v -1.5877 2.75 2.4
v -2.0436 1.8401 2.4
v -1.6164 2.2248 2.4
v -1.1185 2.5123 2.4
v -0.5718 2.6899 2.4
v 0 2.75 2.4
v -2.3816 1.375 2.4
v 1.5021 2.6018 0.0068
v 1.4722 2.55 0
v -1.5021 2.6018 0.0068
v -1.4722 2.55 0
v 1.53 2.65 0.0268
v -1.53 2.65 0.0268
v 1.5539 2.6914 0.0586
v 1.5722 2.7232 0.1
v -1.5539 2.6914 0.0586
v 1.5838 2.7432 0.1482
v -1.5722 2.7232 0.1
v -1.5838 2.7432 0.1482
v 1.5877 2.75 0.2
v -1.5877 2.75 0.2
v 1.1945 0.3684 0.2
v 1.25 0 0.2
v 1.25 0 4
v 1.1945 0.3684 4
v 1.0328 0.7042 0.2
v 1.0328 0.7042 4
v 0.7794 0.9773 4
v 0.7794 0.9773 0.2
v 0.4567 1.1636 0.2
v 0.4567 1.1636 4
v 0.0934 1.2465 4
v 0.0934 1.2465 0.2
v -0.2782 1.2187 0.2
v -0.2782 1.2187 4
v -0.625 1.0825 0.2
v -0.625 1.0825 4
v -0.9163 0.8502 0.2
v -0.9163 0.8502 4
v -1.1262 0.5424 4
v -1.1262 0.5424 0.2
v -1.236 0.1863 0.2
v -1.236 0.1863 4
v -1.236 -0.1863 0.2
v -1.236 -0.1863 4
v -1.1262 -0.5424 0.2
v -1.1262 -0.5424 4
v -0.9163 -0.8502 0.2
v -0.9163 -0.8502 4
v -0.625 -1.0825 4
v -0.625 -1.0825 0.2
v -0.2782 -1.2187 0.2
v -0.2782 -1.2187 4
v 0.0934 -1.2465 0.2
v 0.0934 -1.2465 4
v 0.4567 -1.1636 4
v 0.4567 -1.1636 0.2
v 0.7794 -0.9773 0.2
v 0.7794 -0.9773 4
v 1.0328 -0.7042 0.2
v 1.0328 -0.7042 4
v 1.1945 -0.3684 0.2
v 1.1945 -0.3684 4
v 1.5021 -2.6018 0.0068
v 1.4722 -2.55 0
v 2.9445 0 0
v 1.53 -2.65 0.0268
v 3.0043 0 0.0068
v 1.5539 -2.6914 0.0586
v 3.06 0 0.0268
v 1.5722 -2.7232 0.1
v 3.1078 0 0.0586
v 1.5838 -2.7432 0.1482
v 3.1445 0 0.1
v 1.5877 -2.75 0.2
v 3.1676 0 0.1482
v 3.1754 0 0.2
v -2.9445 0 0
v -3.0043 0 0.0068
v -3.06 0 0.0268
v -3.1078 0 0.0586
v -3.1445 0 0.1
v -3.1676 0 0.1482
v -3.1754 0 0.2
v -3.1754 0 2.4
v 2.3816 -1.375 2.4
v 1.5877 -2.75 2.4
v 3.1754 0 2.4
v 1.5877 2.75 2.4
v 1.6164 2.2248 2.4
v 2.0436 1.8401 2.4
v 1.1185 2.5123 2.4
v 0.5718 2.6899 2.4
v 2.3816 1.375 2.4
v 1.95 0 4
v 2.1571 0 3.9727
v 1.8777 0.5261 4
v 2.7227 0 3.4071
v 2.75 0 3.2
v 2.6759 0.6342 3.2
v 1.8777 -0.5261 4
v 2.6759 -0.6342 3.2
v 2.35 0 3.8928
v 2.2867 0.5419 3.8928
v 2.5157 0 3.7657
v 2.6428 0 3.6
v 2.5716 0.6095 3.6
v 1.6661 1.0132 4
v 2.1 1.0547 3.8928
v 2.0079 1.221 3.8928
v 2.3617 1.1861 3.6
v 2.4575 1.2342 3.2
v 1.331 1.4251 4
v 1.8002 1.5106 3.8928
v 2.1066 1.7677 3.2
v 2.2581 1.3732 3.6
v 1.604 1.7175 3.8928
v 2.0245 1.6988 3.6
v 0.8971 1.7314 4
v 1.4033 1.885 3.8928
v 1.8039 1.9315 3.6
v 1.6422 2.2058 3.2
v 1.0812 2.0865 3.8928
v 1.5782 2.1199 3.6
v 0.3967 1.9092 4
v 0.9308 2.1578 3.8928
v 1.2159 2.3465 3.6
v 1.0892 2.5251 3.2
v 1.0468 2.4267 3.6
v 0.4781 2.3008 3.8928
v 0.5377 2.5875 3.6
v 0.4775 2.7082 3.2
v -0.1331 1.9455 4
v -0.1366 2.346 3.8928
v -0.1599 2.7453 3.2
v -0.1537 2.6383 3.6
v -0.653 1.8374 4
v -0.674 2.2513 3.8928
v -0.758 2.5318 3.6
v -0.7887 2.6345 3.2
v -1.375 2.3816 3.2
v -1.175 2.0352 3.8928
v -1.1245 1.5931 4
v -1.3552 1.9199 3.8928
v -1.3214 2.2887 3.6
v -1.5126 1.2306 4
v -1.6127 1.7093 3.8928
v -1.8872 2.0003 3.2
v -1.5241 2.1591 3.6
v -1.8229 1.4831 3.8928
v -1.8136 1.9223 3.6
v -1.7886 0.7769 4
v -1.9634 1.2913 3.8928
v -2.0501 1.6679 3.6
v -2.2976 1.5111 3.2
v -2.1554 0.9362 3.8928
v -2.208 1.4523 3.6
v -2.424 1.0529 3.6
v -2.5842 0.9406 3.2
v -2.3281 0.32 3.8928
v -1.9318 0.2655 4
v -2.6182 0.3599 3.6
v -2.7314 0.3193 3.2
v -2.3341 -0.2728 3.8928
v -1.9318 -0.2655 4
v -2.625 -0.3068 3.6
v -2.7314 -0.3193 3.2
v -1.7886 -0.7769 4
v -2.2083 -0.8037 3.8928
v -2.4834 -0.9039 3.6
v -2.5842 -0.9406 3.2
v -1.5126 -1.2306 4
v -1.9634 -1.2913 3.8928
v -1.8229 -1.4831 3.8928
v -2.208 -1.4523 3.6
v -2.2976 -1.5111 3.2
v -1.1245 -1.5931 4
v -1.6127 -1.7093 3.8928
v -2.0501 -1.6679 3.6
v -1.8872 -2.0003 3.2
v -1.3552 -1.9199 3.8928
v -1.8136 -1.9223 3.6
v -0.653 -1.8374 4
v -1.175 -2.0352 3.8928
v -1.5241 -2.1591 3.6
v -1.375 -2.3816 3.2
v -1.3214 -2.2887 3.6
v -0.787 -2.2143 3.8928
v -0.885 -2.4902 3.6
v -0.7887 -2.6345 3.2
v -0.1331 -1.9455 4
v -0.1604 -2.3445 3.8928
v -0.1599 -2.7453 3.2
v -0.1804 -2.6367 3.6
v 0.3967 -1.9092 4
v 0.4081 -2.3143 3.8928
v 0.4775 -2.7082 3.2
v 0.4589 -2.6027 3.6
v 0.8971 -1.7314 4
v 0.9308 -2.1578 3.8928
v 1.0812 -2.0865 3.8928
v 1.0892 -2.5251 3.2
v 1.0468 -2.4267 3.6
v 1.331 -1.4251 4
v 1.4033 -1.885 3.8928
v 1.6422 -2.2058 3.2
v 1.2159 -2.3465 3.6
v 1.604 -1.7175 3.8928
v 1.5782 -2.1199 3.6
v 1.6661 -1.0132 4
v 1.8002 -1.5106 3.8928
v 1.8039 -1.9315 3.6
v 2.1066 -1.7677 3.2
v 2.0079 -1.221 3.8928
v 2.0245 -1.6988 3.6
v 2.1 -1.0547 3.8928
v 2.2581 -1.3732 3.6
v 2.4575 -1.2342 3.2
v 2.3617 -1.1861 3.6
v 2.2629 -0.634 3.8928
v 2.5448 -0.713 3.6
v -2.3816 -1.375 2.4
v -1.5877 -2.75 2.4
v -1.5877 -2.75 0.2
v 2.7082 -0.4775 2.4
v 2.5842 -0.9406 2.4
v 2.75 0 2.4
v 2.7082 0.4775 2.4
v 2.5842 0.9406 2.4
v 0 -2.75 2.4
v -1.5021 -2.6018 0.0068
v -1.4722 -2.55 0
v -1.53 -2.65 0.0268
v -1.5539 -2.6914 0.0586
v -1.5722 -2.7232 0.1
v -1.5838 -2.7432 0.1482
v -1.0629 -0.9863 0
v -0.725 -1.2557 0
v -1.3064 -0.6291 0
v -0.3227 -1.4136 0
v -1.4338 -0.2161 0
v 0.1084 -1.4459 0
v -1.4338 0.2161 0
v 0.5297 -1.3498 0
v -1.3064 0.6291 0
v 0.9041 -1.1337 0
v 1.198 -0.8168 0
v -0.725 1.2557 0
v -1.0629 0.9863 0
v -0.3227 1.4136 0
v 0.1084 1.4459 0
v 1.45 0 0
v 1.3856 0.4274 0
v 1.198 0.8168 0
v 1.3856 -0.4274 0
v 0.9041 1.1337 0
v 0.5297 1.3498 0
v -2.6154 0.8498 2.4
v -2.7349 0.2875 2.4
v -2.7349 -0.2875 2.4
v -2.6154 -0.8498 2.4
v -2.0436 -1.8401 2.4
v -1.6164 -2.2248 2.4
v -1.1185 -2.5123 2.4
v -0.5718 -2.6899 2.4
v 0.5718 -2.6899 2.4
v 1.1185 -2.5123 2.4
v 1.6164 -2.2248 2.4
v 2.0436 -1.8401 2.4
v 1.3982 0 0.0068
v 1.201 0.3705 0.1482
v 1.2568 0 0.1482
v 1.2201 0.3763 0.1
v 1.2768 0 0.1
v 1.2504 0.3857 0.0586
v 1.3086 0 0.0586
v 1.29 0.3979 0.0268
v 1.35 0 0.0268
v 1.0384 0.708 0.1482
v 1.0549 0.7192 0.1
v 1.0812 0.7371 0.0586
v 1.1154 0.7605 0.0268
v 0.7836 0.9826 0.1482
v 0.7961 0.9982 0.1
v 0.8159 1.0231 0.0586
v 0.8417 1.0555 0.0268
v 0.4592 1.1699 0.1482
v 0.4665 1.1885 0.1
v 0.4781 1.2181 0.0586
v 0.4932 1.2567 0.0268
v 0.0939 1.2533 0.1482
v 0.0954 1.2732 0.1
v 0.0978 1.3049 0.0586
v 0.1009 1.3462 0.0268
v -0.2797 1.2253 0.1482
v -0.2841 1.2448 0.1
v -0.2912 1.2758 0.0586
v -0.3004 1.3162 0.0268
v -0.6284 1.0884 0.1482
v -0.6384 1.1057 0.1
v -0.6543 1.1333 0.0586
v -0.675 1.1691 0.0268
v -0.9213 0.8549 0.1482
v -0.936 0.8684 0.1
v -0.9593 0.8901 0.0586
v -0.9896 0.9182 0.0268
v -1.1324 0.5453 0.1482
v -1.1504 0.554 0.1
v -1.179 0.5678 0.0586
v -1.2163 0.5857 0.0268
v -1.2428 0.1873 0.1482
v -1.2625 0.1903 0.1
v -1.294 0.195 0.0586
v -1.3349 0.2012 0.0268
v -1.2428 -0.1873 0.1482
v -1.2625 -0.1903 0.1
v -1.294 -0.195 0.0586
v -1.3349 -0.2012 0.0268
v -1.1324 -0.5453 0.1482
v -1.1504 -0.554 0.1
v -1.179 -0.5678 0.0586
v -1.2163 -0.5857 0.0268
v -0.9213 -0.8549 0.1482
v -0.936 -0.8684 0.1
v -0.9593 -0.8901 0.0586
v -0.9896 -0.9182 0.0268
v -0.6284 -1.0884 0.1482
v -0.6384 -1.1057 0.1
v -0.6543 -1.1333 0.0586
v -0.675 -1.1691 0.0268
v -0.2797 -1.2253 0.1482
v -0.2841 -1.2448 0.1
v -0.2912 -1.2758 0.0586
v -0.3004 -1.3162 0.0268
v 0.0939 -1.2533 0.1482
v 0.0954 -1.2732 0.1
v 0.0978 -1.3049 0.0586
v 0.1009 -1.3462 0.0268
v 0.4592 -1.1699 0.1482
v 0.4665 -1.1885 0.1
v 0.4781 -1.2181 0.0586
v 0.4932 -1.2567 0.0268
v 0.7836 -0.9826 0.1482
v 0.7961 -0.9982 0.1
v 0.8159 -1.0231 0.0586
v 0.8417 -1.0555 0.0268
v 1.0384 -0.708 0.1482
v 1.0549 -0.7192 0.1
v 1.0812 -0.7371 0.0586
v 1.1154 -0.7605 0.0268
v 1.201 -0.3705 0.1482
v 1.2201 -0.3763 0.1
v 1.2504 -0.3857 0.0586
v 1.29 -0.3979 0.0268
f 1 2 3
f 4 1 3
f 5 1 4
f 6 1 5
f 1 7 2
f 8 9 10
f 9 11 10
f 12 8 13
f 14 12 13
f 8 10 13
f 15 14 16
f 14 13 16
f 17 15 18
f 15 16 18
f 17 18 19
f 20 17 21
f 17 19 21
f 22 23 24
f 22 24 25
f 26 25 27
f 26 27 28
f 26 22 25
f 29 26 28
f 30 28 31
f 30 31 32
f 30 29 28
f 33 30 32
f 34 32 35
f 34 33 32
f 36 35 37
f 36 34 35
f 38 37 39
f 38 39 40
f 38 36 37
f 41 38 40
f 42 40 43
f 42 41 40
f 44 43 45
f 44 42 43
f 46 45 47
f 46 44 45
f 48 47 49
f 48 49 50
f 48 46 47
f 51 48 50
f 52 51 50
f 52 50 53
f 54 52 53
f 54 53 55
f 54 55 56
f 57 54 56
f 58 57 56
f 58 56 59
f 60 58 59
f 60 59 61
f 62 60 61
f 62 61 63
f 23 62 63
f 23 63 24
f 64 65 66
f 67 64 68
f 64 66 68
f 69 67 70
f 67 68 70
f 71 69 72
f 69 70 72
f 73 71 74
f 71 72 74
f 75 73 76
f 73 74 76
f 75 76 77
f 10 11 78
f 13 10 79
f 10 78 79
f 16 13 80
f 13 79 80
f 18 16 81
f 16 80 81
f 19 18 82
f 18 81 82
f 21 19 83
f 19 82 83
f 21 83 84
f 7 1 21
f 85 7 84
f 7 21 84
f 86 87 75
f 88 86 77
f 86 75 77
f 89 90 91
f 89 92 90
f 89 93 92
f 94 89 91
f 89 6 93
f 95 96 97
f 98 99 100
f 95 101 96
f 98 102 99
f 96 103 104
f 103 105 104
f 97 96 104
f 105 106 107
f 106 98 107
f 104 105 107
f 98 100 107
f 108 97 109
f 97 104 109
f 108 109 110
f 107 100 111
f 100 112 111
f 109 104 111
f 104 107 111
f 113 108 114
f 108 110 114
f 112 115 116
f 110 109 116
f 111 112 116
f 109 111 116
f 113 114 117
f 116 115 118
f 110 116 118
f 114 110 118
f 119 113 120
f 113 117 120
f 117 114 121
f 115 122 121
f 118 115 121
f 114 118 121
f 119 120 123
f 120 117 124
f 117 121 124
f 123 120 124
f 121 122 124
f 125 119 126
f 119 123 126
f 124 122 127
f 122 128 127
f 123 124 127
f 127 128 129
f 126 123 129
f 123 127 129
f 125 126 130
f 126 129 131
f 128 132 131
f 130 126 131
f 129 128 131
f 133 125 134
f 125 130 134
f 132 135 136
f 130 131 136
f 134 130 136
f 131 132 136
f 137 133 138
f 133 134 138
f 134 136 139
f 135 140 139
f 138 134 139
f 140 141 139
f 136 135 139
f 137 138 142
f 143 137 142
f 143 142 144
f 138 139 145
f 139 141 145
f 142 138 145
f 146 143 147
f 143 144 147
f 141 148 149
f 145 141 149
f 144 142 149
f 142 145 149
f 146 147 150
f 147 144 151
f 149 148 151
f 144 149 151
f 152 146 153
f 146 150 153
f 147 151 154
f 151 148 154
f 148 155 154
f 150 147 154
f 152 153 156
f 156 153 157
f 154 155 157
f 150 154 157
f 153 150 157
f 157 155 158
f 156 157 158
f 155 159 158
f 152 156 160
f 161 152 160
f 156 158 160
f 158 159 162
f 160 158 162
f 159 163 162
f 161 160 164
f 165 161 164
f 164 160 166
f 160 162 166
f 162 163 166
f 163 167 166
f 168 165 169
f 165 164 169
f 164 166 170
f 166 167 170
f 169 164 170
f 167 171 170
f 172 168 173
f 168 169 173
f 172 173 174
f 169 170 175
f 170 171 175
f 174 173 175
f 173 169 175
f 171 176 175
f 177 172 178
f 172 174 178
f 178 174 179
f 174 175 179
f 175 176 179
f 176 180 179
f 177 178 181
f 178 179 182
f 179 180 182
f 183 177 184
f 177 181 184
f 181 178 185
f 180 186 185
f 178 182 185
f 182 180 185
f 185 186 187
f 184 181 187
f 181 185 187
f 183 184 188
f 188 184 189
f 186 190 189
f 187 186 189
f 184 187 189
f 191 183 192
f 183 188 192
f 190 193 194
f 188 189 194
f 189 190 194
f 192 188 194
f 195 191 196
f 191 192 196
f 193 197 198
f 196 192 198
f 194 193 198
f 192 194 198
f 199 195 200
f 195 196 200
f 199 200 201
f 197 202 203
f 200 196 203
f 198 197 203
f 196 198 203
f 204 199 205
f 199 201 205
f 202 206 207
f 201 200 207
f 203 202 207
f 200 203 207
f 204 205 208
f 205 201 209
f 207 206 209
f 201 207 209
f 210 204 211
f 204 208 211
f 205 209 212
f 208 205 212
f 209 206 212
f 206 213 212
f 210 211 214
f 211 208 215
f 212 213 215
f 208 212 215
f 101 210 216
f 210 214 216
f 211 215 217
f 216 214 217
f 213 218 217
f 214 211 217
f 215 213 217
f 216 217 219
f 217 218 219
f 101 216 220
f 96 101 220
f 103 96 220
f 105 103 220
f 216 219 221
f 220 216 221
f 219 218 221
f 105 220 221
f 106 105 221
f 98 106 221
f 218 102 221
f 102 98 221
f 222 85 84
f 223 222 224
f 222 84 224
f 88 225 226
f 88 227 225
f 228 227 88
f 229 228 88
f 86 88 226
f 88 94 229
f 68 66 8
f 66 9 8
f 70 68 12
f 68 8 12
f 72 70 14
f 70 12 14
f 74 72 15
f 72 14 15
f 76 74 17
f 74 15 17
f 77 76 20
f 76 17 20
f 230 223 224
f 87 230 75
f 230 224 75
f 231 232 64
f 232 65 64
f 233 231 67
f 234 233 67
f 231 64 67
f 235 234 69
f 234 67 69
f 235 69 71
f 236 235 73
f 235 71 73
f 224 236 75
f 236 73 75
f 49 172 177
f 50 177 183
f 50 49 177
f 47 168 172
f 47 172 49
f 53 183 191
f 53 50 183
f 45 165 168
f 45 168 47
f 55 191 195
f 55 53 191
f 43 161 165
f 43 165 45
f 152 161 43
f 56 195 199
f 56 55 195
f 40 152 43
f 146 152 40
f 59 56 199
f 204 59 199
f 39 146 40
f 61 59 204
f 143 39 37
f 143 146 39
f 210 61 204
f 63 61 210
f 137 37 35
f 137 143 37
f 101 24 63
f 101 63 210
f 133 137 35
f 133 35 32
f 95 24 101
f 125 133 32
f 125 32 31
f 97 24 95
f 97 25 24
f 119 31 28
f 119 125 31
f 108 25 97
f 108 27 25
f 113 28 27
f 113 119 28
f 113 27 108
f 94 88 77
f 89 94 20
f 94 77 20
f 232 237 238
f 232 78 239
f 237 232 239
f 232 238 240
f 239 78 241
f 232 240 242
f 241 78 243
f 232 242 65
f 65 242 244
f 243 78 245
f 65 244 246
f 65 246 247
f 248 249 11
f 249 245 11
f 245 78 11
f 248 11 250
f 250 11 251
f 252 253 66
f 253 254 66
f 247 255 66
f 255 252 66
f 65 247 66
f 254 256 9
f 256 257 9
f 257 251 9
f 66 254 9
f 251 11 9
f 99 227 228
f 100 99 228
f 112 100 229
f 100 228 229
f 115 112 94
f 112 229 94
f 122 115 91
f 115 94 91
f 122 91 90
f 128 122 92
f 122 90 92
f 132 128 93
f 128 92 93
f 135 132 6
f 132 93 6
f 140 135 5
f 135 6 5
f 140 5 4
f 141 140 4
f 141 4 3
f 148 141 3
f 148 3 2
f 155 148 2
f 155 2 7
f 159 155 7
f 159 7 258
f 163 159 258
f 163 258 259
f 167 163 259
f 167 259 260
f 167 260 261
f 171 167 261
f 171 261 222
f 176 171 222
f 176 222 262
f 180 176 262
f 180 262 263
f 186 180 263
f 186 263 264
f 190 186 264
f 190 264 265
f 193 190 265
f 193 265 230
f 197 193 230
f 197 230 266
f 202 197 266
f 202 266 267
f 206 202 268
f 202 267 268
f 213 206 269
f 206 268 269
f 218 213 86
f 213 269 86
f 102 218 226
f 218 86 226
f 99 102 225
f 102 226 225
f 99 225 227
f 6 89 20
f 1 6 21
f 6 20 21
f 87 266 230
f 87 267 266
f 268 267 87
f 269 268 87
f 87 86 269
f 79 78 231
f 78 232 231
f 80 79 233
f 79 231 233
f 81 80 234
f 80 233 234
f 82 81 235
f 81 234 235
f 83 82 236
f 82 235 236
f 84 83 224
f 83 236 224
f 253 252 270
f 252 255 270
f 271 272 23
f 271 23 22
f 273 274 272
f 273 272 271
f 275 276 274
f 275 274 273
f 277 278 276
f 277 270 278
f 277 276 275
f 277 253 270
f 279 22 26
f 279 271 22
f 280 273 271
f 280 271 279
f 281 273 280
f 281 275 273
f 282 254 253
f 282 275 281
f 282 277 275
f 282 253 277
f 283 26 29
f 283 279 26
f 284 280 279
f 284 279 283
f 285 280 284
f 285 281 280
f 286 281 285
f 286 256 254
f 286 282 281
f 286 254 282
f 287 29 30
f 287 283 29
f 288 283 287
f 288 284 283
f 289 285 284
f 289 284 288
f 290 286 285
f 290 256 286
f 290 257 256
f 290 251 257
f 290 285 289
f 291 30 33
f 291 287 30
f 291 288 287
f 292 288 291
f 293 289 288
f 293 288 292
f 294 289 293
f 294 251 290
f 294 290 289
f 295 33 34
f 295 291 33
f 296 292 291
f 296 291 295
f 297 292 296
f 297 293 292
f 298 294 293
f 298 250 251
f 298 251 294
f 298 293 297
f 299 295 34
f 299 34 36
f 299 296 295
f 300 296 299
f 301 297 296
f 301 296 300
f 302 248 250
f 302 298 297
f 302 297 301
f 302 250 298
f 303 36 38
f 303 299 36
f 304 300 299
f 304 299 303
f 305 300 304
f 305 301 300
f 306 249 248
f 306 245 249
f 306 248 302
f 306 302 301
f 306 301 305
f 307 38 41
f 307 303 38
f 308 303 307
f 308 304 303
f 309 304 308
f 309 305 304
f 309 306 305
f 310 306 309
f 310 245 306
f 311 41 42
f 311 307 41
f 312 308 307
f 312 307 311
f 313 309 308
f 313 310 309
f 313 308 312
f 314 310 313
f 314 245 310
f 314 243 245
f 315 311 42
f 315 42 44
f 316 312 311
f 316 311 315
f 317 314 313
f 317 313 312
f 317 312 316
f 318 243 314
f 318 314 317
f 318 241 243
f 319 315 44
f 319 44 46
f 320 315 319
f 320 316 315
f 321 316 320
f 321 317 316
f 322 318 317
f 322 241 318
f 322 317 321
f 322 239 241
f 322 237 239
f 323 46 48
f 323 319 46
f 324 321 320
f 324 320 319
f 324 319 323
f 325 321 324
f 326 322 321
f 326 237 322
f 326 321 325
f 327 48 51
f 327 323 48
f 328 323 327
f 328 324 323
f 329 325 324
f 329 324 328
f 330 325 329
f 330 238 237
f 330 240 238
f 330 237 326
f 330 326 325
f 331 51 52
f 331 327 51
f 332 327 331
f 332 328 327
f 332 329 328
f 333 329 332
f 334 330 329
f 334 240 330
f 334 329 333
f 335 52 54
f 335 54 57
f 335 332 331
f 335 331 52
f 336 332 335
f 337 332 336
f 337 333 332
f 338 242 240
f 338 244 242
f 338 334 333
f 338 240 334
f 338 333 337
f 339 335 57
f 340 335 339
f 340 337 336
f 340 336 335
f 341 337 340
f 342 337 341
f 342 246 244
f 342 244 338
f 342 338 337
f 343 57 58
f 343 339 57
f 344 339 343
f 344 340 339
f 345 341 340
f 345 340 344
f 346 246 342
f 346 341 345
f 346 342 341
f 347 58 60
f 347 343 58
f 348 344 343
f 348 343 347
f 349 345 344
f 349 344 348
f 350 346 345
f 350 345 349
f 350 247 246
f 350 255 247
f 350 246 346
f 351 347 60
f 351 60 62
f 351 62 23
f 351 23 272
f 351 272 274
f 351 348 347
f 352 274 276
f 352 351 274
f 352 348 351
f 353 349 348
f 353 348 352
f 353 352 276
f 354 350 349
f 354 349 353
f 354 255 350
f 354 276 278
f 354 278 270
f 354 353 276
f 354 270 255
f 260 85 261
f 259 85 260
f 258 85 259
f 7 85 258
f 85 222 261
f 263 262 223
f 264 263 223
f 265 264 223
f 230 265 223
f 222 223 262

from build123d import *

# Parameters (mm, degrees)
SKETCH1_R           = 1.25
BOSS_EXTRUDE1_DEPTH = 2.4
SKETCH2_R           = 2.75
SKETCH2_R_2         = 1.25
BOSS_EXTRUDE2_DEPTH = 1.6
FILLET1_R           = 0.2
FILLET2_R           = 0.8


with BuildPart() as part:
    # Sketch1 → Boss-Extrude1 (new body)
    with BuildSketch(Plane.XY):
        Polygon((3.175426481, 0), (1.58771324, 2.75), (-1.58771324, 2.75), (-3.175426481, 0), (-1.58771324, -2.75), (1.58771324, -2.75), align=None)
        Circle(SKETCH1_R, mode=Mode.SUBTRACT)
    extrude(amount=BOSS_EXTRUDE1_DEPTH)

    # Sketch2 → Boss-Extrude2 (add)
    with BuildSketch(Plane.XY.offset(2.4)):
        Circle(SKETCH2_R)
        Circle(SKETCH2_R_2, mode=Mode.SUBTRACT)
    extrude(amount=BOSS_EXTRUDE2_DEPTH)

    # Fillet1
    fillet1_edges = [part.edges().sort_by_distance(p)[0] for p in [
        (-1.25, 0, 0),
        (0, -2.75, 0),
        (-2.38156986, -1.375, 0),
        (-2.38156986, 1.375, 0),
        (0, 2.75, 0),
        (2.38156986, 1.375, 0),
        (2.38156986, -1.375, 0),
    ]]
    fillet(fillet1_edges, radius=FILLET1_R)

    # Fillet2
    fillet2_edges = [part.edges().sort_by_distance(p)[0] for p in [
        (-2.75, 0, 4),
    ]]
    fillet(fillet2_edges, radius=FILLET2_R)


solid = part.part
